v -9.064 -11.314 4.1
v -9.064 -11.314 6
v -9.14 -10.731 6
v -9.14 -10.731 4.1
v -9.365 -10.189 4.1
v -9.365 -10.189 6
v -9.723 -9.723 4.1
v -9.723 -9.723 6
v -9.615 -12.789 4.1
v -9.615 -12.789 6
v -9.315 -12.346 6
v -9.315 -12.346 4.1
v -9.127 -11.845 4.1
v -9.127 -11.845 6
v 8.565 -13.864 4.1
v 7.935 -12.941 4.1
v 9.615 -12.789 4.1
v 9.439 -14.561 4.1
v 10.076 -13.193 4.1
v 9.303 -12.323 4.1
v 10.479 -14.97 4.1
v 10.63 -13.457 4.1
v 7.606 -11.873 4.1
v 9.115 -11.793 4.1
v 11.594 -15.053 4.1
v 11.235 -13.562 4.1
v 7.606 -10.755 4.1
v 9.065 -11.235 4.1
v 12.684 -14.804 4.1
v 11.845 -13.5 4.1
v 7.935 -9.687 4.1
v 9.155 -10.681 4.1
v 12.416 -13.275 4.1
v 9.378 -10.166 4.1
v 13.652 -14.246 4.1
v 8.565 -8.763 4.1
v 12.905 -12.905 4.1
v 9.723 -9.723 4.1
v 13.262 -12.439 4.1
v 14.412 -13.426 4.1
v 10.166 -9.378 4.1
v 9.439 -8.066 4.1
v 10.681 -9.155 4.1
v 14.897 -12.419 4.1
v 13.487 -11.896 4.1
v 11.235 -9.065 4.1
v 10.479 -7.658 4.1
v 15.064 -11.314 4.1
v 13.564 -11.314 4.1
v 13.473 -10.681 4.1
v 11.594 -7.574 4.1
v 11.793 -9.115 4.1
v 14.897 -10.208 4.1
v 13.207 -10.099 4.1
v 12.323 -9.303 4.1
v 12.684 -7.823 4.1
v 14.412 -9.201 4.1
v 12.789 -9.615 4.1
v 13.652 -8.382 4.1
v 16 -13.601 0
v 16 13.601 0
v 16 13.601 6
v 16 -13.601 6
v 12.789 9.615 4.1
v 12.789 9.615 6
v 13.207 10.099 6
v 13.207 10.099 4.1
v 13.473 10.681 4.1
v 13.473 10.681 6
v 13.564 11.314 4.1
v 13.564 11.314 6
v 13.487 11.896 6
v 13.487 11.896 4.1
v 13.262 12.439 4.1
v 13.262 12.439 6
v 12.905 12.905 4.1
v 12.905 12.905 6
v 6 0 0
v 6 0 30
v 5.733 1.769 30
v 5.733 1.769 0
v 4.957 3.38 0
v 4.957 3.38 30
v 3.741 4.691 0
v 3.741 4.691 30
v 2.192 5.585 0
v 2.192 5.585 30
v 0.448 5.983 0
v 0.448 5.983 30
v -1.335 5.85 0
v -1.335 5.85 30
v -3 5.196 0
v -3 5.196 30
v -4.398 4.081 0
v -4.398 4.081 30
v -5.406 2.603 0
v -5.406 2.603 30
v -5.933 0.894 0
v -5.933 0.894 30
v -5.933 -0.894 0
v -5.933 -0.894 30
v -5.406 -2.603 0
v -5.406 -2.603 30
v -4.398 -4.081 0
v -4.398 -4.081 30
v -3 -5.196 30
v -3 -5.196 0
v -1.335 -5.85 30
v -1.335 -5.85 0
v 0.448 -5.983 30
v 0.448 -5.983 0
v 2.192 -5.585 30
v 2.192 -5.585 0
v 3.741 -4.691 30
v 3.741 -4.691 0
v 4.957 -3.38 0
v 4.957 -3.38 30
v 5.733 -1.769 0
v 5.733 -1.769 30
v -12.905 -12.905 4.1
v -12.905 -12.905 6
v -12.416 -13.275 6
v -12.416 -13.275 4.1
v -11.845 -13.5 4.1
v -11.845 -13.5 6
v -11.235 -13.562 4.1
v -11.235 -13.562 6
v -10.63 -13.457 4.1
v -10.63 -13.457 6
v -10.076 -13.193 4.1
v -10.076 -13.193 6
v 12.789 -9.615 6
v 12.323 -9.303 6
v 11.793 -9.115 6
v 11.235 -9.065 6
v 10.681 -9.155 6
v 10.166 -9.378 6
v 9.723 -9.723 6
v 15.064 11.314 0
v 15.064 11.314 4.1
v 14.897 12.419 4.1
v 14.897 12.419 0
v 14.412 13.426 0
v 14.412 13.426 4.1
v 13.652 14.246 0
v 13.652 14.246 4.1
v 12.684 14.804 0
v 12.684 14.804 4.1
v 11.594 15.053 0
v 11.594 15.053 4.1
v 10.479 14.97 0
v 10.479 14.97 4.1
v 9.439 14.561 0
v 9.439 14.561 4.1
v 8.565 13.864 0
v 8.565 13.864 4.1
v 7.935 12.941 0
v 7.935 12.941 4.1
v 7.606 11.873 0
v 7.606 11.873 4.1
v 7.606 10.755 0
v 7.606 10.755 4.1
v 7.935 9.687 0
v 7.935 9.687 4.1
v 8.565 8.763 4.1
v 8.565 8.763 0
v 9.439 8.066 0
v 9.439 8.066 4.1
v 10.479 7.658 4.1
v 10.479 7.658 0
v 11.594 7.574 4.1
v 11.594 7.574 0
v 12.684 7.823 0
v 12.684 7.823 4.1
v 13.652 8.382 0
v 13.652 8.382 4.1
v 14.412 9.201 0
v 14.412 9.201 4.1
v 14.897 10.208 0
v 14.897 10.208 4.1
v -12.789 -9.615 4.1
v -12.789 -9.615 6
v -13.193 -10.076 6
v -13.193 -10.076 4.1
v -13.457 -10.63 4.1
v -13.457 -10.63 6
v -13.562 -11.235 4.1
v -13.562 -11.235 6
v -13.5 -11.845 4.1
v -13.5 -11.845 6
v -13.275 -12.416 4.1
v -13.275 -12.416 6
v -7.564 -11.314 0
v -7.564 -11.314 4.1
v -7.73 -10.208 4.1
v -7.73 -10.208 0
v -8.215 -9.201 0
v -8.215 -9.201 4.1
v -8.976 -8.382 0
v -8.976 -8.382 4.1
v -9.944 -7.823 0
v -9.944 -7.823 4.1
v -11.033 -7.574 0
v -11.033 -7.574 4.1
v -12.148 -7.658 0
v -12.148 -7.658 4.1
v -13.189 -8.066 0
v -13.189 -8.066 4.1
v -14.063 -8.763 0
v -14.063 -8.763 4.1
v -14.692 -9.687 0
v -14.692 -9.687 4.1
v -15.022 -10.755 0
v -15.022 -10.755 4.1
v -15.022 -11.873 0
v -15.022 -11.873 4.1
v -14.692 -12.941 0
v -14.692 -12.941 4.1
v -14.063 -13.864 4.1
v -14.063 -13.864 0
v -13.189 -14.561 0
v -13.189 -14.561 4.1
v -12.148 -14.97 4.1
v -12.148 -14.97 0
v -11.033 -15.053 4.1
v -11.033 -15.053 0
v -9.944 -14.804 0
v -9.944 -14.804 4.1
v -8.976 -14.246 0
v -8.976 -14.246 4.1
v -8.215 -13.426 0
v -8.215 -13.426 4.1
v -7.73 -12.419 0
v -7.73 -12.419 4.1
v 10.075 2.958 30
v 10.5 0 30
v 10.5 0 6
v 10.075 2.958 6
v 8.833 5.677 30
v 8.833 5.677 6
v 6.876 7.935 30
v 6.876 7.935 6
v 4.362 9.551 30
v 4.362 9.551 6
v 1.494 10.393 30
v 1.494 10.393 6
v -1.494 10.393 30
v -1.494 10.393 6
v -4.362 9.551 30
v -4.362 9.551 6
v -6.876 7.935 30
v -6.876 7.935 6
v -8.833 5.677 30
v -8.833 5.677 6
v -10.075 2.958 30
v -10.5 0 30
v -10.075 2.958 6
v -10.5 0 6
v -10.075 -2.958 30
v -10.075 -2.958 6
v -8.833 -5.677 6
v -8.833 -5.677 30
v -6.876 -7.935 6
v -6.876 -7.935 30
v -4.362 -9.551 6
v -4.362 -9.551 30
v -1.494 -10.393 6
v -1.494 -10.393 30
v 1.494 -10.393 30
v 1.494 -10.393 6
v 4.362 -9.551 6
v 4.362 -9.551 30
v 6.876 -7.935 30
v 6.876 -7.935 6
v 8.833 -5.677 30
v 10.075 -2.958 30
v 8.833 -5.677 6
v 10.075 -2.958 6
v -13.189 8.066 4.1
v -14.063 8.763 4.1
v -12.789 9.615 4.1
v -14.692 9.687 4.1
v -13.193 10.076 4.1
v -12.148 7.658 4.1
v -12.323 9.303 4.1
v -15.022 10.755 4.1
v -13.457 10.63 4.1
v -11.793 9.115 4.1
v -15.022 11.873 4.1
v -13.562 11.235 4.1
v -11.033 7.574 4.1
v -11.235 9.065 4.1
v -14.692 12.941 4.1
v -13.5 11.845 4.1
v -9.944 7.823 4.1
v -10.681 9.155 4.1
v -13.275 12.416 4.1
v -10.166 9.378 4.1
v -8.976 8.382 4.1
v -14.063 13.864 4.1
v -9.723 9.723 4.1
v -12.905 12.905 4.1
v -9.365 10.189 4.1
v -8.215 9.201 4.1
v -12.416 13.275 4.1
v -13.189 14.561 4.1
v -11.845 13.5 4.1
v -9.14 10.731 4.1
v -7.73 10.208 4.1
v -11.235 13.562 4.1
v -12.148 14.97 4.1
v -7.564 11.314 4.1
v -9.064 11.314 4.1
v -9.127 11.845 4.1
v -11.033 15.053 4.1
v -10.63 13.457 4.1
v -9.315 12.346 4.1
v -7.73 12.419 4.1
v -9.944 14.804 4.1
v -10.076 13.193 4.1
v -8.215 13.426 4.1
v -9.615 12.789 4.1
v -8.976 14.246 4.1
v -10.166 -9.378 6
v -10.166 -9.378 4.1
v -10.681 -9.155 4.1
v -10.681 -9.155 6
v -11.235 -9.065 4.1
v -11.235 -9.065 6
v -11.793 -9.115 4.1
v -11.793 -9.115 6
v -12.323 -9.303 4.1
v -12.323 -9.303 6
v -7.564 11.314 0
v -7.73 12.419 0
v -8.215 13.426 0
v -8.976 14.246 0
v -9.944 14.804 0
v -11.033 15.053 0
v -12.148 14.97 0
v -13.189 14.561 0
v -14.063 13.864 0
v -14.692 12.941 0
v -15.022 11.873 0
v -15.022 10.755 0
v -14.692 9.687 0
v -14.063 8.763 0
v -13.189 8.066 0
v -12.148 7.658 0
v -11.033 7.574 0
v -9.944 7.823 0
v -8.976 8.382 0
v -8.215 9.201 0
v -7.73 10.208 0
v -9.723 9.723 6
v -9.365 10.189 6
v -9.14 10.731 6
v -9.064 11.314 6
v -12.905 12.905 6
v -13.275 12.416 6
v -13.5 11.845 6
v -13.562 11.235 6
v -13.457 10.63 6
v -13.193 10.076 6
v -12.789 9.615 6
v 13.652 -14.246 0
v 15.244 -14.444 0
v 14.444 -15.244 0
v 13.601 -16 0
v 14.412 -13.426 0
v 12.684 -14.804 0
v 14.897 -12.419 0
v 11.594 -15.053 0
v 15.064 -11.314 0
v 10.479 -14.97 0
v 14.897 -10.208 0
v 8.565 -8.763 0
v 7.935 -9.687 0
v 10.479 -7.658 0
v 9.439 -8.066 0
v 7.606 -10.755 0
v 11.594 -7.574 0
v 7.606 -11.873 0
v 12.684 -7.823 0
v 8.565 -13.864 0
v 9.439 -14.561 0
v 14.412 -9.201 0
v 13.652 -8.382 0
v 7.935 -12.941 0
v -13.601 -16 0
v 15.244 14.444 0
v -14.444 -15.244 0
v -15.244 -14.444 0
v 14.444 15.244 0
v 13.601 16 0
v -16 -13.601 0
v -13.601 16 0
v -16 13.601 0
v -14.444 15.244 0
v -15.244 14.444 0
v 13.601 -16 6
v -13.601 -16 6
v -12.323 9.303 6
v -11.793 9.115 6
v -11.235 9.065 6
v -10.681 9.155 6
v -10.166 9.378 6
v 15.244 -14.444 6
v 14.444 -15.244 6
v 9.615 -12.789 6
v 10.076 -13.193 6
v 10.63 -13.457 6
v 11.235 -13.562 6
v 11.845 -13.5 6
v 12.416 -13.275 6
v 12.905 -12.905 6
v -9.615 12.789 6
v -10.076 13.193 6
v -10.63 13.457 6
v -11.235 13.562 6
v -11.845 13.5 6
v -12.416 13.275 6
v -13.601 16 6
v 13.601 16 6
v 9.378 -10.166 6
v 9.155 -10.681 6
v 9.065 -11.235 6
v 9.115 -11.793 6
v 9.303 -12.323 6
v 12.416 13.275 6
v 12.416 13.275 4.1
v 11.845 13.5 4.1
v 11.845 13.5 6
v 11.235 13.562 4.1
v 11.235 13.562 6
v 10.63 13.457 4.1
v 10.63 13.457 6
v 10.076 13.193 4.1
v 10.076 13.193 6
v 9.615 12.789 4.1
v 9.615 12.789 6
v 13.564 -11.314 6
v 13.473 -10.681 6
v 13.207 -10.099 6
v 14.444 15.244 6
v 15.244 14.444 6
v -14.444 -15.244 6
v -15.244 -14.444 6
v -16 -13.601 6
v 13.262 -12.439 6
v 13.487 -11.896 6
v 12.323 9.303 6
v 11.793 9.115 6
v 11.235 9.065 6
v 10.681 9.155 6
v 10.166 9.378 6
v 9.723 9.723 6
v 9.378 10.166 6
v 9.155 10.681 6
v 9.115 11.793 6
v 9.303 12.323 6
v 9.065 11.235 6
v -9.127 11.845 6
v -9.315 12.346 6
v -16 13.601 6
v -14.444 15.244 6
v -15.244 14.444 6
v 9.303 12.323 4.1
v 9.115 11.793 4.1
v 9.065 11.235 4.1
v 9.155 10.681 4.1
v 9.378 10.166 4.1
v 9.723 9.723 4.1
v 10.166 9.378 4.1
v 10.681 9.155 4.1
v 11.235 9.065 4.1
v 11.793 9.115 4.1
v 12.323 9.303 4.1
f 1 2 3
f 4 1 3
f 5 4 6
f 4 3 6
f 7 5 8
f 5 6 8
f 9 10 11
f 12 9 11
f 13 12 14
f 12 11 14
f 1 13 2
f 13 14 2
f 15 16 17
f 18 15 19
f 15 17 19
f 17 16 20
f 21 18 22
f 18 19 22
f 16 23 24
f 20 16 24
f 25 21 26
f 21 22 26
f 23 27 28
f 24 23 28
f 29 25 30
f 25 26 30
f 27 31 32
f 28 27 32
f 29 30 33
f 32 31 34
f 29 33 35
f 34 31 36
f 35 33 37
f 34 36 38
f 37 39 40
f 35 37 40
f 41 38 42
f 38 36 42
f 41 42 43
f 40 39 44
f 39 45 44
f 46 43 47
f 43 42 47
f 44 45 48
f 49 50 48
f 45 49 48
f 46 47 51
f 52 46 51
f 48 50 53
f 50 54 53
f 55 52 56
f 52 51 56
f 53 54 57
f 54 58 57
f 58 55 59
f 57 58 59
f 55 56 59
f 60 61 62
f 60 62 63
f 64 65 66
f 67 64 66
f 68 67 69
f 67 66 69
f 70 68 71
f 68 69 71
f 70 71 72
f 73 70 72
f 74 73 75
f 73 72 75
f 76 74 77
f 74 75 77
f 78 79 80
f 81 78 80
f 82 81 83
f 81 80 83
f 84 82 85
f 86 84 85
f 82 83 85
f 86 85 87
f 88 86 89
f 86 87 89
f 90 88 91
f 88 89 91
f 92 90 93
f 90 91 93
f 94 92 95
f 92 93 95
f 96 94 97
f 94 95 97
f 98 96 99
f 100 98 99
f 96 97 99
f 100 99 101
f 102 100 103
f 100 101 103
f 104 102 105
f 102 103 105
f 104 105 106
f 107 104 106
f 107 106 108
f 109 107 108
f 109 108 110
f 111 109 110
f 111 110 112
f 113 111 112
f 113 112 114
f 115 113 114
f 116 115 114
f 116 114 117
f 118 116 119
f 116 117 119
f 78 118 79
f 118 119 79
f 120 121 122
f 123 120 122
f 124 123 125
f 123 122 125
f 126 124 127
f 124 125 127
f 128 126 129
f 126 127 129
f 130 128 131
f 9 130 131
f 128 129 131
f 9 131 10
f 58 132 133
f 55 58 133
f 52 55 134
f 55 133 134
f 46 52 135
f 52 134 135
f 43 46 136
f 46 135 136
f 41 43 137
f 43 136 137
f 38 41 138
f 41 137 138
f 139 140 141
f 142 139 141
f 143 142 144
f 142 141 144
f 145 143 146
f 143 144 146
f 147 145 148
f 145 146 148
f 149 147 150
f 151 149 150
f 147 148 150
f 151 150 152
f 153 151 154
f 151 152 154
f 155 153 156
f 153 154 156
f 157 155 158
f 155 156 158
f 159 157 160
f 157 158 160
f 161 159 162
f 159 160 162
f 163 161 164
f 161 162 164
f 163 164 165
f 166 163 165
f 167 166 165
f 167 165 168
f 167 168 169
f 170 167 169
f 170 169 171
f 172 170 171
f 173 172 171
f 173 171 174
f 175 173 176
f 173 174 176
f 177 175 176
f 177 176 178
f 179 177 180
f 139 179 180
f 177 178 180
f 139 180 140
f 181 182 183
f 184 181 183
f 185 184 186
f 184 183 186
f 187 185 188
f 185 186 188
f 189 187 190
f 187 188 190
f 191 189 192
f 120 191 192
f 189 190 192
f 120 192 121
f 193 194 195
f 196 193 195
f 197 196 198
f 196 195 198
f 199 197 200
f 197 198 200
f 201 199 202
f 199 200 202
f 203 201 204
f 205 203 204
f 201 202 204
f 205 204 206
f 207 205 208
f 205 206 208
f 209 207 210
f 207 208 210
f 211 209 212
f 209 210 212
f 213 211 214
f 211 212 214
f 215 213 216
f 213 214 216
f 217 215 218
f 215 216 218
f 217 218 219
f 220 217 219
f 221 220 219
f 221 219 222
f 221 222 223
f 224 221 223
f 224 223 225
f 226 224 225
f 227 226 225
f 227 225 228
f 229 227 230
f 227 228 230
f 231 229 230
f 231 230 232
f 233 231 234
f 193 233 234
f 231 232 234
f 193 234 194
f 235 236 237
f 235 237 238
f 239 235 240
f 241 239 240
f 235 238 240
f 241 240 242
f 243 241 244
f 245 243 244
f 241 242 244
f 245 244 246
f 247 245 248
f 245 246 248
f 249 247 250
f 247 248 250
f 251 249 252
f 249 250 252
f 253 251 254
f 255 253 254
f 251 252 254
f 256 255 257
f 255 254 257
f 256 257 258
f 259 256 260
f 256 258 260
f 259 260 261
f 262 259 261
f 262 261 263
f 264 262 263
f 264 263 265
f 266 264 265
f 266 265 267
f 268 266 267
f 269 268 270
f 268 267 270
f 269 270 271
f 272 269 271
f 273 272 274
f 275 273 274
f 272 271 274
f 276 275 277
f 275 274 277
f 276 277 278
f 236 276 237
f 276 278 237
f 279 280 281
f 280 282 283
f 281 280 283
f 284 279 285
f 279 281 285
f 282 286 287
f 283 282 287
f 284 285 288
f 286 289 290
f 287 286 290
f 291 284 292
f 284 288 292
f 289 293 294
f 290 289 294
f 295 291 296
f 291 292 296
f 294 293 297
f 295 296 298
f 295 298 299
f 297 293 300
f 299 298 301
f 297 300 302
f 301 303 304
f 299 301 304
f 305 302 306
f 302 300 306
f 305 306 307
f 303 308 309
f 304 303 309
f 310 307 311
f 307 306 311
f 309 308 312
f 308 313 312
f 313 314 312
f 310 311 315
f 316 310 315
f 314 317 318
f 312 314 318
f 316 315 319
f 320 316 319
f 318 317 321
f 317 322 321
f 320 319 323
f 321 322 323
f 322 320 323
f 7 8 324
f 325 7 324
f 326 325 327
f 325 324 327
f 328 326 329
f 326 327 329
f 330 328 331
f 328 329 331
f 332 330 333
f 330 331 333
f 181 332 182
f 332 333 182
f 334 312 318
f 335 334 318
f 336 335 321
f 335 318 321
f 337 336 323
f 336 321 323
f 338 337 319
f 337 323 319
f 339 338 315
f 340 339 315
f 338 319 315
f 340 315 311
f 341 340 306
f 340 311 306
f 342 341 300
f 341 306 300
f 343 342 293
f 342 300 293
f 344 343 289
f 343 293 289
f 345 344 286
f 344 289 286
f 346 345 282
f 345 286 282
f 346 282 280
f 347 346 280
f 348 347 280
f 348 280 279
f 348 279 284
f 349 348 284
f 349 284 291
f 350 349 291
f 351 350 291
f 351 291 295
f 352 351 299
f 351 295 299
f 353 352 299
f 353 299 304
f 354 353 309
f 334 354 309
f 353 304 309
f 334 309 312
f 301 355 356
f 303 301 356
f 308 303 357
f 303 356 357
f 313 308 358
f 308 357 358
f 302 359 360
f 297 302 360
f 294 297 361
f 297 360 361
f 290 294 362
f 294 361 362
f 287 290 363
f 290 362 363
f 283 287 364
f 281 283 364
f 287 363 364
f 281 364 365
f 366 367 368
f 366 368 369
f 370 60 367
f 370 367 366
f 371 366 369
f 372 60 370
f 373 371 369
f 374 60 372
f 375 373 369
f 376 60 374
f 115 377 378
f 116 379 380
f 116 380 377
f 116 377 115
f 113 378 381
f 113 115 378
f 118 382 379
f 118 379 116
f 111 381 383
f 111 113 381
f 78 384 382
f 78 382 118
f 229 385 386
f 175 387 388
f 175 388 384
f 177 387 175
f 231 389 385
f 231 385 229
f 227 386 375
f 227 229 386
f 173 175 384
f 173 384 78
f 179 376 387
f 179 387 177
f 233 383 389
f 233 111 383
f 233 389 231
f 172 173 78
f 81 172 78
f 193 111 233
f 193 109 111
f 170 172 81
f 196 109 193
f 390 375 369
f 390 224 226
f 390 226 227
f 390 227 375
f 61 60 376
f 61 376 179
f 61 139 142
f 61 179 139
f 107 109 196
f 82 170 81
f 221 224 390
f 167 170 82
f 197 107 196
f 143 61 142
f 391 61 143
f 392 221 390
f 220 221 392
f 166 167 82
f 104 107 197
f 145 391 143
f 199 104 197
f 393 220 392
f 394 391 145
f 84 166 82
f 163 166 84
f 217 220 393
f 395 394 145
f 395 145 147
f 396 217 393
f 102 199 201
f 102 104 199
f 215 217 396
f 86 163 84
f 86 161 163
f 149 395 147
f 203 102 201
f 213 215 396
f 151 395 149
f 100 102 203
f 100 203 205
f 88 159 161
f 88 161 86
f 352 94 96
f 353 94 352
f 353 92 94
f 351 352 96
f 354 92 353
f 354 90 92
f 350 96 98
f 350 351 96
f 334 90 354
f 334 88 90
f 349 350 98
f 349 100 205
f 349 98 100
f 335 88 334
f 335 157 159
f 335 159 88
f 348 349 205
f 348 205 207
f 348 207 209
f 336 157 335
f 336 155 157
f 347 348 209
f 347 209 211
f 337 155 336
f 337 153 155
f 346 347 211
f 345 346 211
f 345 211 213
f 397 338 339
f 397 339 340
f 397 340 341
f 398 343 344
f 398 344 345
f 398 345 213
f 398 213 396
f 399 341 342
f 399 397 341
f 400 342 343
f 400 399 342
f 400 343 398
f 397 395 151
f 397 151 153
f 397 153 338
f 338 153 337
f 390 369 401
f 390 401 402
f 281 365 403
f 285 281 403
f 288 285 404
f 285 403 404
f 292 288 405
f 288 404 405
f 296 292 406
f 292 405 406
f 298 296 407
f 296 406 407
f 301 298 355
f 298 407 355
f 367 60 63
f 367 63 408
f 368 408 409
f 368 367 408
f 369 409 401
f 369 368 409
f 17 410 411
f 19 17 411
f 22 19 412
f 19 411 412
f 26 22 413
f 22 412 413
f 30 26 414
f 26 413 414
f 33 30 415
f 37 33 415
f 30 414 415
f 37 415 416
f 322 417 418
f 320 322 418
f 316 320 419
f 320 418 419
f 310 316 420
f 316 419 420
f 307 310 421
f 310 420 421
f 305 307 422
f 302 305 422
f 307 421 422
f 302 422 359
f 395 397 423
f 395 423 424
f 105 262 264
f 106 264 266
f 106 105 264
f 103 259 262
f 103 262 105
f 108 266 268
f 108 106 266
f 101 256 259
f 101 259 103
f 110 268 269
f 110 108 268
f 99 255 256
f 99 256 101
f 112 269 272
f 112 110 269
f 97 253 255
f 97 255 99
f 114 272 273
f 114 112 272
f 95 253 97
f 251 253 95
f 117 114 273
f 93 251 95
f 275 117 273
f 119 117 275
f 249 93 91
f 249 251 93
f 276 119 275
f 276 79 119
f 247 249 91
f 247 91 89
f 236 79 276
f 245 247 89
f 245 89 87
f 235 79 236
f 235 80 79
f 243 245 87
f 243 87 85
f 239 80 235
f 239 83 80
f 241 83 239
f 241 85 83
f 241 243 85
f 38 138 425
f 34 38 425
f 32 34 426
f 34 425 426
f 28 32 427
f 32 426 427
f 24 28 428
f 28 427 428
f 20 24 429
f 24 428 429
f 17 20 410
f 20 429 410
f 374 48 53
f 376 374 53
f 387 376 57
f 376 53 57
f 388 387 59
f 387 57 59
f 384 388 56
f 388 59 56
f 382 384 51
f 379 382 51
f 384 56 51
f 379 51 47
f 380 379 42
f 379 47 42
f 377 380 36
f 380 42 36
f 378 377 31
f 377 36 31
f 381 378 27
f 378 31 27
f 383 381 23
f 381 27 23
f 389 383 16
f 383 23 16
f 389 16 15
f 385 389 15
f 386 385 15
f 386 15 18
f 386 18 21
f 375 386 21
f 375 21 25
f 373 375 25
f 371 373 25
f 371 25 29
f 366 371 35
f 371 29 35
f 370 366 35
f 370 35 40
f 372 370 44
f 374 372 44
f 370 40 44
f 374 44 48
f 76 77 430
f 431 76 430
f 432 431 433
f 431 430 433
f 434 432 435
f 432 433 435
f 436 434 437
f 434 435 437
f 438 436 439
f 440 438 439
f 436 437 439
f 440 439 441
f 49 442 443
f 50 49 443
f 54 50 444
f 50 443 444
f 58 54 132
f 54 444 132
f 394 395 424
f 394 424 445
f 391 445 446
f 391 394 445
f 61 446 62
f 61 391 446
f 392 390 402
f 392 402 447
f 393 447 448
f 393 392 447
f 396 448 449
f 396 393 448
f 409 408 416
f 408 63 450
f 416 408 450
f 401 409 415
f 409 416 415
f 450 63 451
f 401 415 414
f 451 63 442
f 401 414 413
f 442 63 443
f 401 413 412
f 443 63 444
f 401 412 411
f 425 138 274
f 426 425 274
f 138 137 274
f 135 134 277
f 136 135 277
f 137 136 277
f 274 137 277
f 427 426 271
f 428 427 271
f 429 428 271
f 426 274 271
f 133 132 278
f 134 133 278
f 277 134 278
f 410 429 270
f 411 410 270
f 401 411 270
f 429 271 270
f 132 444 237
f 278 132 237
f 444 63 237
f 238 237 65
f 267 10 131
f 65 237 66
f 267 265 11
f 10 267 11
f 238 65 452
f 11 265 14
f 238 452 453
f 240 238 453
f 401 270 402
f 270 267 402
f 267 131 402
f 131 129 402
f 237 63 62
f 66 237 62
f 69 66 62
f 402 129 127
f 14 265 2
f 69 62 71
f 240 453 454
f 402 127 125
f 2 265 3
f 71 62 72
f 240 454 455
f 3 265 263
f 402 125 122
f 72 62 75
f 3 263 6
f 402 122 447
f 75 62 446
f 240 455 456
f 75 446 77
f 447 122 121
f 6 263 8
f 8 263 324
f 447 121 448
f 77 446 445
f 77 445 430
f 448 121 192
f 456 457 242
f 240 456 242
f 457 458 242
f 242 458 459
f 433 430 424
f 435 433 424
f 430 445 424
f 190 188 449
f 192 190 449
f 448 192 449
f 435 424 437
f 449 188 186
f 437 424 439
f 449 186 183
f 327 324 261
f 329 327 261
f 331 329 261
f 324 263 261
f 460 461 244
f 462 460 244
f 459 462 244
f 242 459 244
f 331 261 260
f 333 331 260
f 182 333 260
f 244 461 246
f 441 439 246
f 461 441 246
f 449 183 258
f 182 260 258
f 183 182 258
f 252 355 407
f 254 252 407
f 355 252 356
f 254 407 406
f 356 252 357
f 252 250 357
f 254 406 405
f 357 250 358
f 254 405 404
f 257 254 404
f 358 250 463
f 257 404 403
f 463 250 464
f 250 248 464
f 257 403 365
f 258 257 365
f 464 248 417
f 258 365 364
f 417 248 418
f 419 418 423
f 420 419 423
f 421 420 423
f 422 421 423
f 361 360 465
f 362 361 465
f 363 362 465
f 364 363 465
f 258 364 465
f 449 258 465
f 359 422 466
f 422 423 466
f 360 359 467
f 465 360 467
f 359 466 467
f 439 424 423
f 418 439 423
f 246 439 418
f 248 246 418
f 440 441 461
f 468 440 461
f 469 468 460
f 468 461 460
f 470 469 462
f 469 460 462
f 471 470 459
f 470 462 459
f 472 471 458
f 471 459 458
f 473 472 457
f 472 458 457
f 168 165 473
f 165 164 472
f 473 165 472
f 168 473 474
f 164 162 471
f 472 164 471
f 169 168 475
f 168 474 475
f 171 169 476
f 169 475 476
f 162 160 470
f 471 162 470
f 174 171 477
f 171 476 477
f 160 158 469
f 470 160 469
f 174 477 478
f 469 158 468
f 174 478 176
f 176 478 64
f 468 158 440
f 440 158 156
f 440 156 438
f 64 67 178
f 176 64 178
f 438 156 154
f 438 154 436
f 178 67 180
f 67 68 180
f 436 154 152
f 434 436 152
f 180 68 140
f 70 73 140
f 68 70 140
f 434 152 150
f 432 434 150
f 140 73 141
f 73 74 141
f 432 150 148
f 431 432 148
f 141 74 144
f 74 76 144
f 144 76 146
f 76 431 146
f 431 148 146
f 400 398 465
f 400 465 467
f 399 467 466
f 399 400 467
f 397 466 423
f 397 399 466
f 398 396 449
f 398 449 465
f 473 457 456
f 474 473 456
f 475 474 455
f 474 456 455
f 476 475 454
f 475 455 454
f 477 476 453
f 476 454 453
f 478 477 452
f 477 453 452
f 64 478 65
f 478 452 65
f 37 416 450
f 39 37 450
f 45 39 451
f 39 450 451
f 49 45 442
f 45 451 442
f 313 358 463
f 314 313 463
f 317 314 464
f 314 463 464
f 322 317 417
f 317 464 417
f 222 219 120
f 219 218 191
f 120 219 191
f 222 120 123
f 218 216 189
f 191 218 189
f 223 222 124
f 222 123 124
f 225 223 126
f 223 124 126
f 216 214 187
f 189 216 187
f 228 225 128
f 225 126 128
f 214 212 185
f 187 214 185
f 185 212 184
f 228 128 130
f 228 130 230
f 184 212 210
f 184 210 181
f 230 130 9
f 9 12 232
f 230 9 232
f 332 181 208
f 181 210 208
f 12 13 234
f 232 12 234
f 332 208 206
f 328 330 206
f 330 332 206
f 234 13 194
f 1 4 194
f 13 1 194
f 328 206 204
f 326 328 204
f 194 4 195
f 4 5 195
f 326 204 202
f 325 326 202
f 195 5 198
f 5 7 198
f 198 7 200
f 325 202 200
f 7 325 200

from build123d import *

# Parameters (mm, degrees)
EXTRUDE_1_DEPTH     = 6
SKETCH_2_R          = 10.5
EXTRUDE_2_DEPTH     = 24
SKETCH_3_R          = 6
CUT_EXTRUDE_1_DEPTH = 30
CUT_EXTRUDE_2_DEPTH = 1.9
SKETCH_5_R          = 3.75
CUT_EXTRUDE_3_DEPTH = 4.1


with BuildPart() as part:
    # 草图1 → 凸台-拉伸1 (new body)
    with BuildSketch(Plane.XY):
        with BuildLine():
            Line((-13.601470509, 16), (13.601470509, 16))
            ThreePointArc((13.601470509, 16), (14.849242405, 14.849242405), (16, 13.601470509))
            Line((16, 13.601470509), (16, -13.601470509))
            ThreePointArc((16, -13.601470509), (14.849242405, -14.849242405), (13.601470509, -16))
            Line((13.601470509, -16), (-13.601470509, -16))
            ThreePointArc((-13.601470509, -16), (-14.849242405, -14.849242405), (-16, -13.601470509))
            Line((-16, -13.601470509), (-16, 13.601470509))
            ThreePointArc((-16, 13.601470509), (-14.849242405, 14.849242405), (-13.601470509, 16))
        make_face()
    extrude(amount=EXTRUDE_1_DEPTH)

    # 草图2 → 凸台-拉伸2 (add)
    with BuildSketch(Plane.XY.offset(6)):
        Circle(SKETCH_2_R)
    extrude(amount=EXTRUDE_2_DEPTH)

    # 草图3 → 切除-拉伸1 (cut)
    with BuildSketch(Plane.XY.offset(30)):
        Circle(SKETCH_3_R)
    extrude(amount=-CUT_EXTRUDE_1_DEPTH, mode=Mode.SUBTRACT)

    # 草图4 → 切除-拉伸2 (cut)
    with BuildSketch(Plane.XY.offset(6)):
        with BuildLine():
            ThreePointArc((-12.788894575, 9.614789418), (-11.234557947, 9.06510111), (-9.722718241, 9.722718241))
            Line((-9.722718241, 9.722718241), (-11.313708499, 11.313708499))
            ThreePointArc((-11.313708499, 11.313708499), (-12.081202351, 10.490212093), (-12.788894575, 9.614789418))
        make_face()
        with BuildLine():
            Line((-11.313708499, 11.313708499), (-9.722718241, 9.722718241))
            ThreePointArc((-9.722718241, 9.722718241), (-9.234979551, 10.452670776), (-9.063708499, 11.313708499))
            ThreePointArc((-9.063708499, 11.313708499), (-9.205976551, 12.101087718), (-9.614789418, 12.788894575))
            ThreePointArc((-9.614789418, 12.788894575), (-10.490212093, 12.081202351), (-11.313708499, 11.313708499))
        make_face()
        with BuildLine():
            ThreePointArc((-12.788894575, 9.614789418), (-12.081202351, 10.490212093), (-11.313708499, 11.313708499))
            Line((-11.313708499, 11.313708499), (-12.904698757, 12.904698757))
            ThreePointArc((-12.904698757, 12.904698757), (-13.562315888, 11.234557947), (-12.788894575, 9.614789418))
        make_face()
        with BuildLine():
            Line((-12.904698757, 12.904698757), (-11.313708499, 11.313708499))
            ThreePointArc((-11.313708499, 11.313708499), (-10.490212093, 12.081202351), (-9.614789418, 12.788894575))
            ThreePointArc((-9.614789418, 12.788894575), (-11.234557947, 13.562315888), (-12.904698757, 12.904698757))
        make_face()
        with BuildLine():
            ThreePointArc((9.614789418, 12.788894575), (9.06510111, 11.234557947), (9.722718241, 9.722718241))
            Line((9.722718241, 9.722718241), (11.313708499, 11.313708499))
            ThreePointArc((11.313708499, 11.313708499), (10.490212093, 12.081202351), (9.614789418, 12.788894575))
        make_face()
        with BuildLine():
            Line((11.313708499, 11.313708499), (9.722718241, 9.722718241))
            ThreePointArc((9.722718241, 9.722718241), (11.234557947, 9.06510111), (12.788894575, 9.614789418))
            ThreePointArc((12.788894575, 9.614789418), (12.081202351, 10.490212093), (11.313708499, 11.313708499))
        make_face()
        with BuildLine():
            ThreePointArc((9.614789418, 12.788894575), (10.490212093, 12.081202351), (11.313708499, 11.313708499))
            Line((11.313708499, 11.313708499), (12.904698757, 12.904698757))
            ThreePointArc((12.904698757, 12.904698757), (11.234557947, 13.562315888), (9.614789418, 12.788894575))
        make_face()
        with BuildLine():
            Line((12.904698757, 12.904698757), (11.313708499, 11.313708499))
            ThreePointArc((11.313708499, 11.313708499), (12.081202351, 10.490212093), (12.788894575, 9.614789418))
            ThreePointArc((12.788894575, 9.614789418), (13.360861238, 10.380078131), (13.563708499, 11.313708499))
            ThreePointArc((13.563708499, 11.313708499), (13.392437447, 12.174746222), (12.904698757, 12.904698757))
        make_face()
        with BuildLine():
            ThreePointArc((12.788894575, -9.614789418), (11.234557947, -9.06510111), (9.722718241, -9.722718241))
            Line((9.722718241, -9.722718241), (11.313708499, -11.313708499))
            ThreePointArc((11.313708499, -11.313708499), (12.081202351, -10.490212093), (12.788894575, -9.614789418))
        make_face()
        with BuildLine():
            Line((11.313708499, -11.313708499), (9.722718241, -9.722718241))
            ThreePointArc((9.722718241, -9.722718241), (9.06510111, -11.234557947), (9.614789418, -12.788894575))
            ThreePointArc((9.614789418, -12.788894575), (10.490212093, -12.081202351), (11.313708499, -11.313708499))
        make_face()
        with BuildLine():
            ThreePointArc((12.788894575, -9.614789418), (12.081202351, -10.490212093), (11.313708499, -11.313708499))
            Line((11.313708499, -11.313708499), (12.904698757, -12.904698757))
            ThreePointArc((12.904698757, -12.904698757), (13.392437447, -12.174746222), (13.563708499, -11.313708499))
            ThreePointArc((13.563708499, -11.313708499), (13.360861238, -10.380078131), (12.788894575, -9.614789418))
        make_face()
        with BuildLine():
            Line((12.904698757, -12.904698757), (11.313708499, -11.313708499))
            ThreePointArc((11.313708499, -11.313708499), (10.490212093, -12.081202351), (9.614789418, -12.788894575))
            ThreePointArc((9.614789418, -12.788894575), (11.234557947, -13.562315888), (12.904698757, -12.904698757))
        make_face()
        with BuildLine():
            ThreePointArc((-9.063708499, -11.313708499), (-9.234979551, -10.452670776), (-9.722718241, -9.722718241))
            Line((-9.722718241, -9.722718241), (-11.313708499, -11.313708499))
            ThreePointArc((-11.313708499, -11.313708499), (-10.490212093, -12.081202351), (-9.614789418, -12.788894575))
            ThreePointArc((-9.614789418, -12.788894575), (-9.205976551, -12.101087718), (-9.063708499, -11.313708499))
        make_face()
        with BuildLine():
            Line((-11.313708499, -11.313708499), (-9.722718241, -9.722718241))
            ThreePointArc((-9.722718241, -9.722718241), (-11.234557947, -9.06510111), (-12.788894575, -9.614789418))
            ThreePointArc((-12.788894575, -9.614789418), (-12.081202351, -10.490212093), (-11.313708499, -11.313708499))
        make_face()
        with BuildLine():
            ThreePointArc((-9.614789418, -12.788894575), (-10.490212093, -12.081202351), (-11.313708499, -11.313708499))
            Line((-11.313708499, -11.313708499), (-12.904698757, -12.904698757))
            ThreePointArc((-12.904698757, -12.904698757), (-11.234557947, -13.562315888), (-9.614789418, -12.788894575))
        make_face()
        with BuildLine():
            Line((-12.904698757, -12.904698757), (-11.313708499, -11.313708499))
            ThreePointArc((-11.313708499, -11.313708499), (-12.081202351, -10.490212093), (-12.788894575, -9.614789418))
            ThreePointArc((-12.788894575, -9.614789418), (-13.562315888, -11.234557947), (-12.904698757, -12.904698757))
        make_face()
    extrude(amount=-CUT_EXTRUDE_2_DEPTH, mode=Mode.SUBTRACT)

    # 草图5 → 切除-拉伸3 (cut)
    with BuildSketch(Plane.XY.offset(4.1)):
        with Locations((-11.313708499, 11.313708499)):
            Circle(SKETCH_5_R)
        with Locations((11.313708499, 11.313708499)):
            Circle(SKETCH_5_R)
        with Locations((11.313708499, -11.313708499)):
            Circle(SKETCH_5_R)
        with Locations((-11.313708499, -11.313708499)):
            Circle(SKETCH_5_R)
    extrude(amount=-CUT_EXTRUDE_3_DEPTH, mode=Mode.SUBTRACT)


solid = part.part
